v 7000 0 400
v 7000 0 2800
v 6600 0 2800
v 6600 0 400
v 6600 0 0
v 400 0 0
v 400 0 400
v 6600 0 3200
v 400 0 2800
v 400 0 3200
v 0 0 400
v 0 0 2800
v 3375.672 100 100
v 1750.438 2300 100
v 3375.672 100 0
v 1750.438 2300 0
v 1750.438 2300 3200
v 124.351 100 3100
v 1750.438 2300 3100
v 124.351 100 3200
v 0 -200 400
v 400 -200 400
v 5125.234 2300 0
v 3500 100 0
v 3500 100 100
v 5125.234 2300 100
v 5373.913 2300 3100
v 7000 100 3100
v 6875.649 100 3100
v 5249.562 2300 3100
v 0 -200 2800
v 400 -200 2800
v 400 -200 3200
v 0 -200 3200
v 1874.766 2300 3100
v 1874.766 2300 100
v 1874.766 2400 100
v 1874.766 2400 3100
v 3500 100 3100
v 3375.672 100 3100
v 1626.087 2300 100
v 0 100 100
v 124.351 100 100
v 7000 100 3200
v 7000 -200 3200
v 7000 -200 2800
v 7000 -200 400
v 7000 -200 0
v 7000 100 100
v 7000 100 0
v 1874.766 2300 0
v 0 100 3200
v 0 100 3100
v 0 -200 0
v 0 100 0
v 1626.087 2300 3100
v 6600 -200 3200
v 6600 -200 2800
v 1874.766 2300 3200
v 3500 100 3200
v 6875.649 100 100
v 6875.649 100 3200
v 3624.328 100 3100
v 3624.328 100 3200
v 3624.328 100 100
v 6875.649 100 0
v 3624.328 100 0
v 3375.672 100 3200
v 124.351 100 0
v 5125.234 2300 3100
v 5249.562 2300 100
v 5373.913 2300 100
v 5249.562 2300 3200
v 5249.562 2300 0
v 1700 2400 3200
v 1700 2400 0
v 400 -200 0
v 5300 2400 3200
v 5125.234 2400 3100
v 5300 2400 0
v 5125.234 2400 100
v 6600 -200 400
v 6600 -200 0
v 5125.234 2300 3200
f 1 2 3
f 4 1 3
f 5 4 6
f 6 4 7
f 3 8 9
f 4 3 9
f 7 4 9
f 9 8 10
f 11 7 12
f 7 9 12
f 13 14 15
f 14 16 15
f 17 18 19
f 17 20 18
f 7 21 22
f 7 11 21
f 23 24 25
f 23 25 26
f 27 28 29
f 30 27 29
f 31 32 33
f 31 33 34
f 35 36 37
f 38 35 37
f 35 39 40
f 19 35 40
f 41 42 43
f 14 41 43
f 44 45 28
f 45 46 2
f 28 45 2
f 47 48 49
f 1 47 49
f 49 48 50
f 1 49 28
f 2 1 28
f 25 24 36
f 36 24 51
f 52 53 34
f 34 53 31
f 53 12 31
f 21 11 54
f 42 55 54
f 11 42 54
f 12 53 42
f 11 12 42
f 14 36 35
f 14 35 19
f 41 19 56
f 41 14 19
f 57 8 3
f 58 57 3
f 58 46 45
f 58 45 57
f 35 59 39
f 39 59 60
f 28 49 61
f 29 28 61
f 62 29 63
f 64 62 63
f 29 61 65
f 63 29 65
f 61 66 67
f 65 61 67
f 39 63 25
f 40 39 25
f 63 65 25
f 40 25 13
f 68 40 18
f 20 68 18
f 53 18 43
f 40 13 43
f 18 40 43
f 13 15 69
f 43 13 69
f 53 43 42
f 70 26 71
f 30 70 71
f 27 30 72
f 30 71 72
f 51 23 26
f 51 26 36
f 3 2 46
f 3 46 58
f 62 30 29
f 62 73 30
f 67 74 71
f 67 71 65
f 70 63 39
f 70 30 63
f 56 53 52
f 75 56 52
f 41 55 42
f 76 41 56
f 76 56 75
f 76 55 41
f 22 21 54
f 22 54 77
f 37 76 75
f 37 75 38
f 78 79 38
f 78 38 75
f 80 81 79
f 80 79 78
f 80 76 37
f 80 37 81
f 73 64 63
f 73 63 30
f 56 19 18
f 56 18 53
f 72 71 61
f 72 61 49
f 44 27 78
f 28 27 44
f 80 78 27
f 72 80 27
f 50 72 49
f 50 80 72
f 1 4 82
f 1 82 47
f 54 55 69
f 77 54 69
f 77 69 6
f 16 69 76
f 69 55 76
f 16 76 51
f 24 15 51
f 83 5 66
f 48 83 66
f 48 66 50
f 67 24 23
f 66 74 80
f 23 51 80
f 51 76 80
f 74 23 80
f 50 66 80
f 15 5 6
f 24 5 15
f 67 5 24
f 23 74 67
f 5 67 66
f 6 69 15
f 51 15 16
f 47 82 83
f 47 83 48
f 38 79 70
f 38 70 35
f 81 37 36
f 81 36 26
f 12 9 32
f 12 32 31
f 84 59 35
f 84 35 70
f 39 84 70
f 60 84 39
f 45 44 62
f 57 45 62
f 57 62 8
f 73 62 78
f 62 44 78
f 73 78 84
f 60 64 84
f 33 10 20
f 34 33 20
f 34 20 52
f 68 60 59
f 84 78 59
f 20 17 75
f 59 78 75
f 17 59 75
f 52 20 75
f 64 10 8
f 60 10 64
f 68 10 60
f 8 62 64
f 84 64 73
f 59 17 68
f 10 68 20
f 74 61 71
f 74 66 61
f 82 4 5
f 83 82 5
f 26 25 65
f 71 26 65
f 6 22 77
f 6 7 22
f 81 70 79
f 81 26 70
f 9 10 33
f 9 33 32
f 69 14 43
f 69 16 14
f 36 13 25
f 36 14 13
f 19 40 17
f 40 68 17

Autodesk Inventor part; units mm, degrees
ref_plane "YZ Plane" through (0, 0, 0) normal (1, 0, 0) x (0, 1, 0)
ref_plane "XZ Plane" through (0, 0, 0) normal (0, 1, 0) x (-1, 0, 0)
ref_plane "XY Plane" through (0, 0, 0) normal (0, 0, 1) x (1, 0, 0)
sketch "Sketch1" plane through (0, 0, 0) normal (0, 0, 1) x (1, 0, 0)
  line L0 (0, 0) -> (7000, 0)
  line L1 (7000, 0) -> (7000, 100)
  line L2 (0, 100) -> (0, 0)
  line L3 (1700, 2400) -> (5300, 2400)
  line L4 (0, 100) -> (1700, 2400)
  line L5 (1750.4378, 2300) -> (124.3509, 100)
  line L6 (5300, 2400) -> (7000, 100)
  line L7 (6875.6491, 100) -> (5249.5622, 2300)
  line L8 (3500, 100) -> (1874.7657, 2300)
  line L9 (3500, 100) -> (5125.2343, 2300)
  line L10 (1750.4378, 2300) -> (3375.6722, 100)
  line L11 (5125.2343, 2300) -> (1874.7657, 2300)
  line L12 (5249.5622, 2300) -> (3624.3278, 100)
  line L13 (6875.6491, 100) -> (3624.3278, 100)
  line L14 (3375.6722, 100) -> (124.3509, 100)
  dimension "d15" = 100
  dimension "d16" = 100
  dimension "d17" = 100
  dimension "d18" = 100
  dimension "d19" = 100
  dimension "d20" = 100
  dimension "d21" = 100
  dimension "d23" = 1700
  dimension "d25" = 3500
  dimension "d27" = 100
  dimension "d28" = 100
  dimension "d39" = 3500
  dimension "d40" = 2200
  dimension "d42" = 100
  dimension "d50" = 1700
  dimension "d51" = 2300
  dimension "d52" = 2300
  dimension "d53" = 100
extrude "Extrusion1" add sketch "Sketch1" along normal blind 100
sketch "Sketch2" plane through (0, 0, 100) normal (0, 0, 1) x (1, 0, 0)
  line L0 (3624.3278, 100) -> (6875.6491, 100) projected
  line L1 (6875.6491, 100) -> (5249.5622, 2300) projected
  line L2 (5249.5622, 2300) -> (3624.3278, 100) projected
  line L3 (3375.6722, 100) -> (1750.4378, 2300) projected
  line L4 (1750.4378, 2300) -> (124.3509, 100) projected
  line L5 (124.3509, 100) -> (3375.6722, 100) projected
  line L6 (1874.7657, 2300) -> (3500, 100) projected
  line L7 (3500, 100) -> (5125.2343, 2300) projected
  line L8 (5125.2343, 2300) -> (1874.7657, 2300) projected
  line L9 (0, 0) -> (0, 100) projected
  line L10 (0, 100) -> (1700, 2400) projected
  line L11 (1700, 2400) -> (5300, 2400) projected
  line L12 (5300, 2400) -> (7000, 100) projected
  line L13 (7000, 100) -> (7000, 0) projected
  line L14 (7000, 0) -> (0, 0) projected
  line L15 (0, 100) -> (7000, 100)
  line L16 (7000, 100) -> (7000, 0)
  line L17 (7000, 0) -> (0, 0)
  line L18 (0, 0) -> (0, 100)
  line L19 (1874.7657, 2300) -> (3500, 100) projected
  line L20 (1874.7657, 2300) -> (1626.087, 2300)
  line L21 (1874.7657, 2300) -> (1874.7657, 2400)
  line L22 (5300, 2400) -> (1700, 2400) projected
  line L23 (1874.7657, 2400) -> (1700, 2400)
  line L24 (1700, 2400) -> (1626.087, 2300)
  line L25 (5125.2343, 2300) -> (3500, 100) projected
  line L26 (5125.2343, 2300) -> (5373.913, 2300)
  line L27 (5373.913, 2300) -> (5300, 2400)
  line L28 (5125.2343, 2300) -> (5125.2343, 2400)
  line L29 (5125.2343, 2400) -> (5300, 2400)
  line L30 (1700, 2400) -> (0, 100) projected
  line L31 (7000, 100) -> (5300, 2400) projected
extrude "Extrusion6" add sketch "Sketch2" along normal blind 1500 contours L0 L15 L13 L14 L9 L5 | L26 L28 L11 L12 | L20 L10 L11 L21
sketch "Sketch5" plane through (0, 0, 0) normal (0, -1, 0) x (1, 0, 0)
  line L0 (0, 1600) -> (7000, 1600)
  line L1 (7000, 1600) -> (7000, 0) projected
  line L2 (7000, 0) -> (0, 0) projected
  line L3 (0, 0) -> (0, 1600) projected
  line L4 (7000, 1600) -> (0, 1600)
  line L5 (0, 1600) -> (400, 1600)
  line L6 (400, 1600) -> (400, 0)
  line L7 (400, 0) -> (0, 0)
  line L8 (0, 0) -> (0, 1600)
  line L9 (0, 0) -> (7000, 0) projected
  line L10 (7000, 1600) -> (6600, 1600)
  line L11 (6600, 1600) -> (6600, 0)
  line L12 (6600, 0) -> (7000, 0)
  line L13 (7000, 0) -> (7000, 1600)
  dimension "d58" = 400
  dimension "d59" = 400
extrude "Extrusion7" add sketch "Sketch5" along normal blind 200 contours L0 L6 L2 L3 | L0 L1 L2 L11
sketch "Sketch6" plane through (0, 0, 1600) normal (0, 0, 1) x (1, 0, 0)
  line L0 (1874.7657, 2400) -> (1874.7657, 2300) projected
  line L1 (1874.7657, 2300) -> (1626.087, 2300) projected
  line L2 (1626.087, 2300) -> (1700, 2400) projected
  line L3 (1700, 2400) -> (1874.7657, 2400) projected
  line L4 (5373.913, 2300) -> (5125.2343, 2300) projected
  line L5 (5125.2343, 2300) -> (5125.2343, 2400) projected
  line L6 (5125.2343, 2400) -> (5300, 2400) projected
  line L7 (5300, 2400) -> (5373.913, 2300) projected
  line L8 (0, 100) -> (7000, 100) projected
  line L9 (7000, 100) -> (7000, -200) projected
  line L10 (7000, -200) -> (6600, -200) projected
  line L11 (6600, -200) -> (6600, 0) projected
  line L12 (6600, 0) -> (400, 0) projected
  line L13 (400, 0) -> (400, -200) projected
  line L14 (400, -200) -> (0, -200) projected
  line L15 (0, -200) -> (0, 100) projected
  line L16 (400, 0) -> (400, -200) projected
  line L17 (400, -200) -> (0, -200) projected
  line L18 (400, 0) -> (0, 0)
  line L19 (0, 0) -> (0, -200)
  line L20 (0, -200) -> (400, -200)
  line L21 (400, -200) -> (400, 0)
  line L22 (400, 0) -> (6600, 0) projected
  line L23 (6600, -200) -> (7000, -200) projected
  line L24 (6600, 0) -> (7000, 0)
  line L25 (7000, 0) -> (7000, -200)
  line L26 (7000, -200) -> (6600, -200)
  line L27 (6600, -200) -> (6600, 0)
  point P0 (0, 0)
extrude "Extrusion8" cut sketch "Sketch6" against normal blind 1200 contours L18 L13 L14 L15 | L9 L10 L11 L24
mirror "Mirror4" about plane through (5237.1831, 2344.295, 1600) normal (0, 0, 1)
ref_plane "Work Plane3" through (400, 0, 1600) normal (0, 0, 1) x (1, 0, 0)
ref_plane "Work Plane4" through (3500, 100, 0) normal (-1, 0, 0) x (0, 0, 1)
properties part number "bridge"
